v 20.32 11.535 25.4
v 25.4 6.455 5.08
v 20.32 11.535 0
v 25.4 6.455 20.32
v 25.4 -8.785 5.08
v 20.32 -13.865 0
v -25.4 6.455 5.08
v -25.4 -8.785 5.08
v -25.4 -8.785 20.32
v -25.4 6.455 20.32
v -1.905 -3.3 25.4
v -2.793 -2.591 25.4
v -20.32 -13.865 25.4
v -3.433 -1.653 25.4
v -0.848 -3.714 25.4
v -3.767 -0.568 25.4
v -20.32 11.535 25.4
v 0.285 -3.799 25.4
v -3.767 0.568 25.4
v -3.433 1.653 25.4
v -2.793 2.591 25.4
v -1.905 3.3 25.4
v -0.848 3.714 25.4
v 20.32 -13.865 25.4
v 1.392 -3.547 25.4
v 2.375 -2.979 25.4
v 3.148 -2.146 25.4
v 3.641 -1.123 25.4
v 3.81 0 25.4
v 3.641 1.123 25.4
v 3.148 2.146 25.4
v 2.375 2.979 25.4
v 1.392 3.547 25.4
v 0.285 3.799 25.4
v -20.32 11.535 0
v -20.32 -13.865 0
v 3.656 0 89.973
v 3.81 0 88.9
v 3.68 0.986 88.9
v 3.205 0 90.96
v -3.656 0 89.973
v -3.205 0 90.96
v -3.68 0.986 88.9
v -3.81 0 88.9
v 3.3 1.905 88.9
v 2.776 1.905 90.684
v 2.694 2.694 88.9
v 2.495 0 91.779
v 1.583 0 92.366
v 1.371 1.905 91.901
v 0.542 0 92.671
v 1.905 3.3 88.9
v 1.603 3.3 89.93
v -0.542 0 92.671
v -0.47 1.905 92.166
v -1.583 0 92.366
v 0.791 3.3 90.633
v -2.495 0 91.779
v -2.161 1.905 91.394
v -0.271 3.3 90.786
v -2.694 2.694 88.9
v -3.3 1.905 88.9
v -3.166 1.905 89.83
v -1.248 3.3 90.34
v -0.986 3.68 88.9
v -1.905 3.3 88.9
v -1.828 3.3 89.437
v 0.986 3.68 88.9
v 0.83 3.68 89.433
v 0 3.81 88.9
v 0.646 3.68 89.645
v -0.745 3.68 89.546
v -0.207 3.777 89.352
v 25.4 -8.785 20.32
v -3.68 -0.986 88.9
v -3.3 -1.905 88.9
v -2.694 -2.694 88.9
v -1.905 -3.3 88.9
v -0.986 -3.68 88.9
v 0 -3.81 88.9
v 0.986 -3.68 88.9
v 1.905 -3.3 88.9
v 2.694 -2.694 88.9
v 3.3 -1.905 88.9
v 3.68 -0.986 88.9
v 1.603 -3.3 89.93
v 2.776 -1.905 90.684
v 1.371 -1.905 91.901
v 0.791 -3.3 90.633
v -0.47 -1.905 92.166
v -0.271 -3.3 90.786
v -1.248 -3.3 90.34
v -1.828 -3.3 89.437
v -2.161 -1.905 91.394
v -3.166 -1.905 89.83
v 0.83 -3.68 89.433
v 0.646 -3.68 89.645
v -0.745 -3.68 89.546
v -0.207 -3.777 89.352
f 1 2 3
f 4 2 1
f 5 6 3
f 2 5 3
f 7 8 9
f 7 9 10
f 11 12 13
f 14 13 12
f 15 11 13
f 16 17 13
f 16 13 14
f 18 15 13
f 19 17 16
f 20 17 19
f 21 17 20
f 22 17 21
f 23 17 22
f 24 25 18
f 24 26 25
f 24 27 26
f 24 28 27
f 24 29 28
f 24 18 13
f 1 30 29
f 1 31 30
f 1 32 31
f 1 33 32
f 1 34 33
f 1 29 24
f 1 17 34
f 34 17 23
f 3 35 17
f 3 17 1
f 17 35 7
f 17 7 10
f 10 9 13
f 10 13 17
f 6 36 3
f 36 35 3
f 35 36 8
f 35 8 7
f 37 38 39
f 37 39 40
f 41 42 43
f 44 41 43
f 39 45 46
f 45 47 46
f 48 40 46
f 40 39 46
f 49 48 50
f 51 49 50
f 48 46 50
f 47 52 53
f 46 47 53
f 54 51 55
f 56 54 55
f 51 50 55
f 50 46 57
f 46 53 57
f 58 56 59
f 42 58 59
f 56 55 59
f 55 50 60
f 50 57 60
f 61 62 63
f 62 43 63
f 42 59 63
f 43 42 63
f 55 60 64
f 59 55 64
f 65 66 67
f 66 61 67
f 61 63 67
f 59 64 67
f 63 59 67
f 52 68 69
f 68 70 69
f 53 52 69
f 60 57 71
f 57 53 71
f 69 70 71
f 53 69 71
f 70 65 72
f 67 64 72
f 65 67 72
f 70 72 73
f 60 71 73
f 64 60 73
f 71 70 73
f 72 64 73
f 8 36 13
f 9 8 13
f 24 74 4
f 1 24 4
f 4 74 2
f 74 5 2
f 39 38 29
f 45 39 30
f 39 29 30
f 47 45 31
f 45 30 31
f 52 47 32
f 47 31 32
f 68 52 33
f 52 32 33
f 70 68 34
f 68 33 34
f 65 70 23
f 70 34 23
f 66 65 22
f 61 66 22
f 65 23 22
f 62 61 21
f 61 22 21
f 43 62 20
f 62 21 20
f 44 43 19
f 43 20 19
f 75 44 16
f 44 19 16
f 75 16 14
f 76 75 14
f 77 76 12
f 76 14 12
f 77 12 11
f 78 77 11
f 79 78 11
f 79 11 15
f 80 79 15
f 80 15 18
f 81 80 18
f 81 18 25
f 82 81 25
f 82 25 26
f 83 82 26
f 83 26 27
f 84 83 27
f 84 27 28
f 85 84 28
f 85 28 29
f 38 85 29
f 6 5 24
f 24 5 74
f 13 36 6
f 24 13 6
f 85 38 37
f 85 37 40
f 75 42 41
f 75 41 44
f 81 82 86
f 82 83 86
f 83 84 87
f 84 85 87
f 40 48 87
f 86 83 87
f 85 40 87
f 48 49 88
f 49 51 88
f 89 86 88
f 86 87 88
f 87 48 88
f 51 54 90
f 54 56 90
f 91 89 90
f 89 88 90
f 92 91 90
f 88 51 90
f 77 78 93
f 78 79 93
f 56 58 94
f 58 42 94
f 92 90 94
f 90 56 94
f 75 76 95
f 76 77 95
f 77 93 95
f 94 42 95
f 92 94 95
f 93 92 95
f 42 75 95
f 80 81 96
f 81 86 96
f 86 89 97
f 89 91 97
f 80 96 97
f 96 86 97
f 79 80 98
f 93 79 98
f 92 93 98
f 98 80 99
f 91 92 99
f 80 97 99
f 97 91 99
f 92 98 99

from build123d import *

# Parameters (mm, degrees)
F0_W     = 50.8
F0_H     = 25.4
F1_DEPTH = 25.4
F2_R     = 3.81
F3_DEPTH = 63.5
F6_SIZE  = 5.08


with BuildPart() as f1:
    # F0 (on Top) → F1 (new body)
    with BuildSketch(Plane.XY):
        with Locations((0, -1.165138)):
            Rectangle(F0_W, F0_H)
    extrude(amount=F1_DEPTH)

    # F2 (on face) → F3 (join)
    with BuildSketch(Plane.XY.offset(25.4)):
        Circle(F2_R)
    extrude(amount=F3_DEPTH)

    # F4 (on face) → F5 (revolve)
    with BuildSketch(Plane.XY.offset(88.9)):
        with BuildLine():
            Line((0, 3.81), (0, -3.81))
            ThreePointArc((0, -3.81), (2.694077, -2.694077), (3.81, 0))
            ThreePointArc((3.81, 0), (2.694077, 2.694077), (0, 3.81))
        make_face()
    revolve(axis=Axis((0, 0, 88.9), (0, -1, 0)))

    # F6
    f6_edges = [f1.edges().sort_by_distance(p)[0] for p in [
        (-25.4, 11.534862, 12.7),
        (-25.4, -1.165138, 25.4),
        (25.4, -1.165138, 25.4),
        (25.4, 11.534862, 12.7),
        (25.4, -1.165138, 0),
        (25.4, -13.865138, 12.7),
        (-25.4, -13.865138, 12.7),
        (-25.4, -1.165138, 0),
    ]]
    chamfer(f6_edges, length=F6_SIZE)


solid = f1.part
